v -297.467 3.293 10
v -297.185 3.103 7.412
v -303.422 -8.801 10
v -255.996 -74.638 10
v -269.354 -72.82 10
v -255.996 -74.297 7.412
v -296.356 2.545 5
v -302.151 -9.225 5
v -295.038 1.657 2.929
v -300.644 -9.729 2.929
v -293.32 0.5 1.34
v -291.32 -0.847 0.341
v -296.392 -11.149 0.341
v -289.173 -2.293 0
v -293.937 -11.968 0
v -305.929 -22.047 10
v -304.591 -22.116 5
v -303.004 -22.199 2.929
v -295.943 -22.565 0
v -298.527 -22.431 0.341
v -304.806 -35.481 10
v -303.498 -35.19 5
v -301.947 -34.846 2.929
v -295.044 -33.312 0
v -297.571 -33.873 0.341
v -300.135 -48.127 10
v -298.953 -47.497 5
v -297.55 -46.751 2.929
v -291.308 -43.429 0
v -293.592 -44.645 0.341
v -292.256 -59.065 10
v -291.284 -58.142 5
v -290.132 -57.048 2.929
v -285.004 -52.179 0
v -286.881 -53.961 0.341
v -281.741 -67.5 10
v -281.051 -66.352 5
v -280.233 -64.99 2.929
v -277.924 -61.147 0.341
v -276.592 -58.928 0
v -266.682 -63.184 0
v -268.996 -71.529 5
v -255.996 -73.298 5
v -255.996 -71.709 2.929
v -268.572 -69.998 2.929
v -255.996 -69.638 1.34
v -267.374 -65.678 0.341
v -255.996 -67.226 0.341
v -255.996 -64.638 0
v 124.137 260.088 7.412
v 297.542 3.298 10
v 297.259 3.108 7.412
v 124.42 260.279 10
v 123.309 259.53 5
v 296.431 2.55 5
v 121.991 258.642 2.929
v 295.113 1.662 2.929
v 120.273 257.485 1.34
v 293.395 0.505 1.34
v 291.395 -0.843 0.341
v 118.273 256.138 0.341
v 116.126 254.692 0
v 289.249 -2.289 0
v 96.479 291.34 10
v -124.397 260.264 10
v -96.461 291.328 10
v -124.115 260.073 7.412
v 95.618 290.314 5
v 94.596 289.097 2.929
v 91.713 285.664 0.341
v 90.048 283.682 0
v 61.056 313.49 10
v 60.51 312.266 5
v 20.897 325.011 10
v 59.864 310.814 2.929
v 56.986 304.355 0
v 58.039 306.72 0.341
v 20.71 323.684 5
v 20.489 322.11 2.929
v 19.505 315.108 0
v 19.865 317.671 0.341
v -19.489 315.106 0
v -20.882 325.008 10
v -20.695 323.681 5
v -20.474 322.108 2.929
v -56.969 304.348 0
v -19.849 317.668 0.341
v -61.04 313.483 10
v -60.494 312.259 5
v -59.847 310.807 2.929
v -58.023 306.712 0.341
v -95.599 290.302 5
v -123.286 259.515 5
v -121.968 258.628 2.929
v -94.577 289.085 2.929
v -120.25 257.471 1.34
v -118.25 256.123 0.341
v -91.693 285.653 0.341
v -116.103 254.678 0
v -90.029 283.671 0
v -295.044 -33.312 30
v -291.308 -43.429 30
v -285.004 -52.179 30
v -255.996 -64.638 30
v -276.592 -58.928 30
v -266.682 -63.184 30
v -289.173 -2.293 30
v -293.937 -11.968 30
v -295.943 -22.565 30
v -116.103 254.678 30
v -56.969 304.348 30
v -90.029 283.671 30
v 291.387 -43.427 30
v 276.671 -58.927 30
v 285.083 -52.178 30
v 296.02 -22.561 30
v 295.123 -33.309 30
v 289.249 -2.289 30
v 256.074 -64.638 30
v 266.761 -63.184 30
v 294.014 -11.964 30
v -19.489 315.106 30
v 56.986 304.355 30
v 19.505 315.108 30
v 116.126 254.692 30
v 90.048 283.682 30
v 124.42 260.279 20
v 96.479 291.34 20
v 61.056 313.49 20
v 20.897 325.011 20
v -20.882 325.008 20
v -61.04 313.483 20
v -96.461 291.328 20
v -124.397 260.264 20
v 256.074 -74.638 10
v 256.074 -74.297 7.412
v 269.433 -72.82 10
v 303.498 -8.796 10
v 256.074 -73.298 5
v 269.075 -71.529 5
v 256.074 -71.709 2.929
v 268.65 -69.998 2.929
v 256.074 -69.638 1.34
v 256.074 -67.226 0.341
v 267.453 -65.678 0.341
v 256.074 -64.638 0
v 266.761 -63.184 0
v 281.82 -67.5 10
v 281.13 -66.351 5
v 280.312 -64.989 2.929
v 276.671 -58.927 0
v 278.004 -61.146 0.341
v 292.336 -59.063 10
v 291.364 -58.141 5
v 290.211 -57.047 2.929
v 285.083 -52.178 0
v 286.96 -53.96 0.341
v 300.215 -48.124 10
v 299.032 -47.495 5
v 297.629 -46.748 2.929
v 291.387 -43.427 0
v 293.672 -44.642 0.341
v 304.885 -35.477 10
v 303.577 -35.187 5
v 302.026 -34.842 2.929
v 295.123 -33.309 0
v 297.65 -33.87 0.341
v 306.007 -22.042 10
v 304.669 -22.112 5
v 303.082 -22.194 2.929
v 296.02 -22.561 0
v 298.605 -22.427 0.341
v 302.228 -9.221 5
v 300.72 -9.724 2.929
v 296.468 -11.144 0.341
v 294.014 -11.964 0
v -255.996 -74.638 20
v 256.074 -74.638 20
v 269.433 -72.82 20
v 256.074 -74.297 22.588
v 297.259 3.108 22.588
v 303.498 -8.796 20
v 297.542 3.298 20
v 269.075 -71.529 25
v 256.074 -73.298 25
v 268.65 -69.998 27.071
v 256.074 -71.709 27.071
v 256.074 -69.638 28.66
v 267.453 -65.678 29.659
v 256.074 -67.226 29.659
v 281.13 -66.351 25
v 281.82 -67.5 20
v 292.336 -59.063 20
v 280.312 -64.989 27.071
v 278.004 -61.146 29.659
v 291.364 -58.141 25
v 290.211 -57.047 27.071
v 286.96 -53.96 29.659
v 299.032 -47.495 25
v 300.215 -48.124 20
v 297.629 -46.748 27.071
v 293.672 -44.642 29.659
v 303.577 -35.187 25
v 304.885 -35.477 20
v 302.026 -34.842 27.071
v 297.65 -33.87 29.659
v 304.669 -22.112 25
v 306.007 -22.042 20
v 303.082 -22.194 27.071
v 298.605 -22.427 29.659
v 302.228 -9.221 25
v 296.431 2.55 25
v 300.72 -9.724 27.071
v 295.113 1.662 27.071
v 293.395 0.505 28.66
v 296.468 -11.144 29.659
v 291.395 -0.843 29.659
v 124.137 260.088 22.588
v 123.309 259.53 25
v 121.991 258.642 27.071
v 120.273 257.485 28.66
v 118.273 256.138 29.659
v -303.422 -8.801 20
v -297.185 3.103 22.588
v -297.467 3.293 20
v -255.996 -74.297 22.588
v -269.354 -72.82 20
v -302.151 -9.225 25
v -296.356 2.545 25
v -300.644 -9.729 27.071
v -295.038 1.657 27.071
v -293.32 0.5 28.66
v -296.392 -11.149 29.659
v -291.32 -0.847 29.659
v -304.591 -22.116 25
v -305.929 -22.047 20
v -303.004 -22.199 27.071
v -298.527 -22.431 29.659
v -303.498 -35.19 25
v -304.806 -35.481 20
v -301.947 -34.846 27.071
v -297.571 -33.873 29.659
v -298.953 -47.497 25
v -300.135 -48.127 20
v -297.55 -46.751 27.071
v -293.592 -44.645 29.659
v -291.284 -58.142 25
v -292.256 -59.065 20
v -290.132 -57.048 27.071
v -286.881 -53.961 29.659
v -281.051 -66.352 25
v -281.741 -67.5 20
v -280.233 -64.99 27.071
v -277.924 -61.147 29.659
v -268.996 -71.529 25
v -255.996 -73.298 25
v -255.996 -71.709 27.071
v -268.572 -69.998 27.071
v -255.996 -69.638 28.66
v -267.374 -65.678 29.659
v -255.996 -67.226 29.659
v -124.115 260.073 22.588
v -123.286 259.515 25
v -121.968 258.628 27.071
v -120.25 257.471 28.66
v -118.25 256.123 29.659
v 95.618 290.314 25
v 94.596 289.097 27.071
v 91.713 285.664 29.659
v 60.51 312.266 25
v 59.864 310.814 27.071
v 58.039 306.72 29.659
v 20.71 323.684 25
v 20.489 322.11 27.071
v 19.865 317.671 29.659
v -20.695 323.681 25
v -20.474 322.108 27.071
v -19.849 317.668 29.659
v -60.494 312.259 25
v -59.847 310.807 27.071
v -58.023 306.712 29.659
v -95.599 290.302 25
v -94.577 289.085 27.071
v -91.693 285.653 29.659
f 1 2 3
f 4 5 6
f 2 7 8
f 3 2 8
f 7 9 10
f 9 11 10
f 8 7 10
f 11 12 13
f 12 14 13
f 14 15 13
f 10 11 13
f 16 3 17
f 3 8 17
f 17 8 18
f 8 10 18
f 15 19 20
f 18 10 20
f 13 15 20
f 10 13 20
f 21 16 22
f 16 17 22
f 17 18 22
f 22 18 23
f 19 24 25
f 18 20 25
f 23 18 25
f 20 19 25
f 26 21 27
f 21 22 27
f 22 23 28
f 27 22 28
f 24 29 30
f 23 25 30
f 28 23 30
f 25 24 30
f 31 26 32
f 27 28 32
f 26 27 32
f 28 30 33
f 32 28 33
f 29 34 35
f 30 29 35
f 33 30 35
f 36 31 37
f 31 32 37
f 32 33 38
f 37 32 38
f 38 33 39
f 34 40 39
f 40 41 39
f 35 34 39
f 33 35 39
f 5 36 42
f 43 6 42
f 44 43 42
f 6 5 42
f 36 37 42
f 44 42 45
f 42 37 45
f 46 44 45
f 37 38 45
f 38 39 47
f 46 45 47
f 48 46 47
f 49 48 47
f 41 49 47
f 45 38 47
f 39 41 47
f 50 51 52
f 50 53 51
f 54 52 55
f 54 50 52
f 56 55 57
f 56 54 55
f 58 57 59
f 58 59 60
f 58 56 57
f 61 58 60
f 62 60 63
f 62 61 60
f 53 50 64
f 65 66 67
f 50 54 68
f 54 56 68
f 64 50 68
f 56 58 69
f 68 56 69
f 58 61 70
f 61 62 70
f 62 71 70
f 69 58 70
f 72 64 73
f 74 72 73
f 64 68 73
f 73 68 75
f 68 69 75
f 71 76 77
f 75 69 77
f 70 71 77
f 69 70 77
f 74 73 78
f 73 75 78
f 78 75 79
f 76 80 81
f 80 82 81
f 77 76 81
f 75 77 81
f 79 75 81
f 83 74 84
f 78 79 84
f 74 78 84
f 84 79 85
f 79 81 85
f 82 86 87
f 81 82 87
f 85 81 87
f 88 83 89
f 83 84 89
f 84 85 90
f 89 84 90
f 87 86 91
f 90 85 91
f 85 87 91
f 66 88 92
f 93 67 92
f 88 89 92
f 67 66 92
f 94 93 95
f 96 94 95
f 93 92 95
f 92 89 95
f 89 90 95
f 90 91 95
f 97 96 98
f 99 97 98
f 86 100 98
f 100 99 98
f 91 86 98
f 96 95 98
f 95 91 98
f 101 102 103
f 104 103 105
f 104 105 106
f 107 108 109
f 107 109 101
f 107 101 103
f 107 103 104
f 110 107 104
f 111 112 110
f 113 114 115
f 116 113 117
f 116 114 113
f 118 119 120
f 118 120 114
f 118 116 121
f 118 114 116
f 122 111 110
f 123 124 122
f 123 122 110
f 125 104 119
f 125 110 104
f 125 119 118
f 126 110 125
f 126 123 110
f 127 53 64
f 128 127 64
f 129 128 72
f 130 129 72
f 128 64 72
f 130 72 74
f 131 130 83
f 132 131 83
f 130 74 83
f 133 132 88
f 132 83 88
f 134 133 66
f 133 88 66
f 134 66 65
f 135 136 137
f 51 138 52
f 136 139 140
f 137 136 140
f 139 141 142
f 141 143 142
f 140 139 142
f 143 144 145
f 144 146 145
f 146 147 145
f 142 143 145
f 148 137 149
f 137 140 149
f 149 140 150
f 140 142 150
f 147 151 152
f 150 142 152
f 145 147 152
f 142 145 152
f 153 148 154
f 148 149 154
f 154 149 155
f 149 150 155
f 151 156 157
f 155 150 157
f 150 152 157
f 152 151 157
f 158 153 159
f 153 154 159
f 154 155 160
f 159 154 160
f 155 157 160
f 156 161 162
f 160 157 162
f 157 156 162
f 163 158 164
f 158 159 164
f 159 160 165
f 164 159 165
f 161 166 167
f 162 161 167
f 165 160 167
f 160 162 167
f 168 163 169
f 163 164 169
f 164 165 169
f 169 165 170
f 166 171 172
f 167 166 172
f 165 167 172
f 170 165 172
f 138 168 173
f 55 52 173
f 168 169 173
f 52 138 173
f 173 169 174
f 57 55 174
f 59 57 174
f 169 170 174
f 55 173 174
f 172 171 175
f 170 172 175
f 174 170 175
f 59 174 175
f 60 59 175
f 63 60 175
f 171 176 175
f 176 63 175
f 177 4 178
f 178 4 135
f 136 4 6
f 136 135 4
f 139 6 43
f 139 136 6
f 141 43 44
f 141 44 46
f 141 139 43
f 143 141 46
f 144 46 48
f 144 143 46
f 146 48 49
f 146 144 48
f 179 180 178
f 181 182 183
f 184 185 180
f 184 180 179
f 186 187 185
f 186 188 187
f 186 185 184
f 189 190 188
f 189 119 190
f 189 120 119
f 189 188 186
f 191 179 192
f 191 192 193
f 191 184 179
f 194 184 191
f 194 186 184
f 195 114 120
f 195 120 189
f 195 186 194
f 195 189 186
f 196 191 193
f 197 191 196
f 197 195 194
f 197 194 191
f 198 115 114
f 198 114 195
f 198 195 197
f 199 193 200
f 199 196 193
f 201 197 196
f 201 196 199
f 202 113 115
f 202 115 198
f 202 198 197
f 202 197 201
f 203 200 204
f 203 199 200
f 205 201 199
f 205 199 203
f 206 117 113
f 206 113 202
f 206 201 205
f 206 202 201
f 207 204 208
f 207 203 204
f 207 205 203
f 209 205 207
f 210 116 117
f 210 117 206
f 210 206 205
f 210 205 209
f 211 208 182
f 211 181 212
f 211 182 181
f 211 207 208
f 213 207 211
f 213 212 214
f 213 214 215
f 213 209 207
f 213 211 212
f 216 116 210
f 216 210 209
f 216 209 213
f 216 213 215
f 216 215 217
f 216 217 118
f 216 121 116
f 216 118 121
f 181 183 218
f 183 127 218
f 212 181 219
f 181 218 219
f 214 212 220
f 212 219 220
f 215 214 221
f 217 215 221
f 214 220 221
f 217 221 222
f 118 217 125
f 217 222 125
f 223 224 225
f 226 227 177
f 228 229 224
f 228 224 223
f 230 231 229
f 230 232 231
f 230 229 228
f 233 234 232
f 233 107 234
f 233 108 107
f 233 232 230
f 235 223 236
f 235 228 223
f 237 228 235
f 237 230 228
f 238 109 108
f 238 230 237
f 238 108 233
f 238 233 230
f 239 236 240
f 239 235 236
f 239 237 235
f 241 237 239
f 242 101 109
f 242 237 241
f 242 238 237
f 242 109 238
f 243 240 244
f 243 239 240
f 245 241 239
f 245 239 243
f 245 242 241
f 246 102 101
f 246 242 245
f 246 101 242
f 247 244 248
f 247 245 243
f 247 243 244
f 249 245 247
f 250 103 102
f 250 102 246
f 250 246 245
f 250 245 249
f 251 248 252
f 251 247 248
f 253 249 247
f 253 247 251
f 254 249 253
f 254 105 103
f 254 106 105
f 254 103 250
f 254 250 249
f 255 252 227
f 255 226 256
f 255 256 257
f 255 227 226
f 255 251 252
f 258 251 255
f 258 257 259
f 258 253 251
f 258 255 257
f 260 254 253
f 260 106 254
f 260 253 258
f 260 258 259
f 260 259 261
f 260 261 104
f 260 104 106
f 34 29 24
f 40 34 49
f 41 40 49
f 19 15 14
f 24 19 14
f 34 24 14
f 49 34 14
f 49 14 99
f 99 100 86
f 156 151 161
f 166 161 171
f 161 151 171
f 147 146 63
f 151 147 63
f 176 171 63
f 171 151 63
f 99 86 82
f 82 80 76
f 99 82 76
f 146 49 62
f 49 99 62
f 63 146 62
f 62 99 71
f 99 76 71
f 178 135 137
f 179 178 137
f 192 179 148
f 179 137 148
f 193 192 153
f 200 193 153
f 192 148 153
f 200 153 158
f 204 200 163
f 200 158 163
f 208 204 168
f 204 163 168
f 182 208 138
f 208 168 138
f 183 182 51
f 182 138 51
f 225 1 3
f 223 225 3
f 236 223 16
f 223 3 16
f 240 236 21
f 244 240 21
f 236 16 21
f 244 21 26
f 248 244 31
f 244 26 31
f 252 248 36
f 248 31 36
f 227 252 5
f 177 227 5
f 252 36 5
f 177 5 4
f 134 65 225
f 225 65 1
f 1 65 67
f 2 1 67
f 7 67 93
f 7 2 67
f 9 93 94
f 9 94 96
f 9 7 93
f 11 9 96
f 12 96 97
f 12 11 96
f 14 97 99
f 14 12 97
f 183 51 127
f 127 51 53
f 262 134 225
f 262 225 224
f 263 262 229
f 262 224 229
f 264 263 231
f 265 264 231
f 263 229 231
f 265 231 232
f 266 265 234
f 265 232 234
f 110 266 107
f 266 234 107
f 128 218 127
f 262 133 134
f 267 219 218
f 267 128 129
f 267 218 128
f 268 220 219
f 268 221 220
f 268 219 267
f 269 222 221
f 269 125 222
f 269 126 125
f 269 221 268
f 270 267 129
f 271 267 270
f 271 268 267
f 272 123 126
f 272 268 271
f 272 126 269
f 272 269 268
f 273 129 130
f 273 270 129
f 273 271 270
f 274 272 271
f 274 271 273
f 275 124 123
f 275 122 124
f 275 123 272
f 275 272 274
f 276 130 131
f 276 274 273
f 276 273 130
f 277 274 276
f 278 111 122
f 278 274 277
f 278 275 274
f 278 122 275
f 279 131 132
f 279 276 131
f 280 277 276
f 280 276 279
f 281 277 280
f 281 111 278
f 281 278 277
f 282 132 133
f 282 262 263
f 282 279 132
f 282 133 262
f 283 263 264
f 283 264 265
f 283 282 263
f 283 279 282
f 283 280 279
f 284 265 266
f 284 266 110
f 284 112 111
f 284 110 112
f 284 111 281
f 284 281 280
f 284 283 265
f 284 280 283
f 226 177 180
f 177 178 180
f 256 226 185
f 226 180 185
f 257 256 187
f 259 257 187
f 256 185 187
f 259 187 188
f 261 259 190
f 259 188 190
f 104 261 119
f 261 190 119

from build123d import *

# Parameters (mm, degrees)
F1_DEPTH = 30
F2_R     = 10


with BuildPart() as f1:
    # F0 (on Top) → F1 (new body)
    with BuildSketch(Plane.XY):
        with BuildLine():
            ThreePointArc((-297.467466, 3.293289), (-300.135499, -48.126514), (-255.996245, -74.637659))
            Line((-255.996245, -74.637659), (256.074257, -74.637659))
            ThreePointArc((256.074257, -74.637659), (300.214937, -48.123832), (297.542083, 3.298328))
            Line((297.542083, 3.298328), (124.419791, 260.278877))
            ThreePointArc((124.419791, 260.278877), (0.007199, 326.470917), (-124.397351, 260.263762))
            Line((-124.397351, 260.263762), (-297.467466, 3.293289))
        make_face()
    extrude(amount=F1_DEPTH)

    # F2
    f2_edges = [f1.edges().sort_by_distance(p)[0] for p in [
        (-210.932408, 131.778525, 30),
        (-210.932408, 131.778525, 0),
    ]]
    fillet(f2_edges, radius=F2_R)


solid = f1.part
